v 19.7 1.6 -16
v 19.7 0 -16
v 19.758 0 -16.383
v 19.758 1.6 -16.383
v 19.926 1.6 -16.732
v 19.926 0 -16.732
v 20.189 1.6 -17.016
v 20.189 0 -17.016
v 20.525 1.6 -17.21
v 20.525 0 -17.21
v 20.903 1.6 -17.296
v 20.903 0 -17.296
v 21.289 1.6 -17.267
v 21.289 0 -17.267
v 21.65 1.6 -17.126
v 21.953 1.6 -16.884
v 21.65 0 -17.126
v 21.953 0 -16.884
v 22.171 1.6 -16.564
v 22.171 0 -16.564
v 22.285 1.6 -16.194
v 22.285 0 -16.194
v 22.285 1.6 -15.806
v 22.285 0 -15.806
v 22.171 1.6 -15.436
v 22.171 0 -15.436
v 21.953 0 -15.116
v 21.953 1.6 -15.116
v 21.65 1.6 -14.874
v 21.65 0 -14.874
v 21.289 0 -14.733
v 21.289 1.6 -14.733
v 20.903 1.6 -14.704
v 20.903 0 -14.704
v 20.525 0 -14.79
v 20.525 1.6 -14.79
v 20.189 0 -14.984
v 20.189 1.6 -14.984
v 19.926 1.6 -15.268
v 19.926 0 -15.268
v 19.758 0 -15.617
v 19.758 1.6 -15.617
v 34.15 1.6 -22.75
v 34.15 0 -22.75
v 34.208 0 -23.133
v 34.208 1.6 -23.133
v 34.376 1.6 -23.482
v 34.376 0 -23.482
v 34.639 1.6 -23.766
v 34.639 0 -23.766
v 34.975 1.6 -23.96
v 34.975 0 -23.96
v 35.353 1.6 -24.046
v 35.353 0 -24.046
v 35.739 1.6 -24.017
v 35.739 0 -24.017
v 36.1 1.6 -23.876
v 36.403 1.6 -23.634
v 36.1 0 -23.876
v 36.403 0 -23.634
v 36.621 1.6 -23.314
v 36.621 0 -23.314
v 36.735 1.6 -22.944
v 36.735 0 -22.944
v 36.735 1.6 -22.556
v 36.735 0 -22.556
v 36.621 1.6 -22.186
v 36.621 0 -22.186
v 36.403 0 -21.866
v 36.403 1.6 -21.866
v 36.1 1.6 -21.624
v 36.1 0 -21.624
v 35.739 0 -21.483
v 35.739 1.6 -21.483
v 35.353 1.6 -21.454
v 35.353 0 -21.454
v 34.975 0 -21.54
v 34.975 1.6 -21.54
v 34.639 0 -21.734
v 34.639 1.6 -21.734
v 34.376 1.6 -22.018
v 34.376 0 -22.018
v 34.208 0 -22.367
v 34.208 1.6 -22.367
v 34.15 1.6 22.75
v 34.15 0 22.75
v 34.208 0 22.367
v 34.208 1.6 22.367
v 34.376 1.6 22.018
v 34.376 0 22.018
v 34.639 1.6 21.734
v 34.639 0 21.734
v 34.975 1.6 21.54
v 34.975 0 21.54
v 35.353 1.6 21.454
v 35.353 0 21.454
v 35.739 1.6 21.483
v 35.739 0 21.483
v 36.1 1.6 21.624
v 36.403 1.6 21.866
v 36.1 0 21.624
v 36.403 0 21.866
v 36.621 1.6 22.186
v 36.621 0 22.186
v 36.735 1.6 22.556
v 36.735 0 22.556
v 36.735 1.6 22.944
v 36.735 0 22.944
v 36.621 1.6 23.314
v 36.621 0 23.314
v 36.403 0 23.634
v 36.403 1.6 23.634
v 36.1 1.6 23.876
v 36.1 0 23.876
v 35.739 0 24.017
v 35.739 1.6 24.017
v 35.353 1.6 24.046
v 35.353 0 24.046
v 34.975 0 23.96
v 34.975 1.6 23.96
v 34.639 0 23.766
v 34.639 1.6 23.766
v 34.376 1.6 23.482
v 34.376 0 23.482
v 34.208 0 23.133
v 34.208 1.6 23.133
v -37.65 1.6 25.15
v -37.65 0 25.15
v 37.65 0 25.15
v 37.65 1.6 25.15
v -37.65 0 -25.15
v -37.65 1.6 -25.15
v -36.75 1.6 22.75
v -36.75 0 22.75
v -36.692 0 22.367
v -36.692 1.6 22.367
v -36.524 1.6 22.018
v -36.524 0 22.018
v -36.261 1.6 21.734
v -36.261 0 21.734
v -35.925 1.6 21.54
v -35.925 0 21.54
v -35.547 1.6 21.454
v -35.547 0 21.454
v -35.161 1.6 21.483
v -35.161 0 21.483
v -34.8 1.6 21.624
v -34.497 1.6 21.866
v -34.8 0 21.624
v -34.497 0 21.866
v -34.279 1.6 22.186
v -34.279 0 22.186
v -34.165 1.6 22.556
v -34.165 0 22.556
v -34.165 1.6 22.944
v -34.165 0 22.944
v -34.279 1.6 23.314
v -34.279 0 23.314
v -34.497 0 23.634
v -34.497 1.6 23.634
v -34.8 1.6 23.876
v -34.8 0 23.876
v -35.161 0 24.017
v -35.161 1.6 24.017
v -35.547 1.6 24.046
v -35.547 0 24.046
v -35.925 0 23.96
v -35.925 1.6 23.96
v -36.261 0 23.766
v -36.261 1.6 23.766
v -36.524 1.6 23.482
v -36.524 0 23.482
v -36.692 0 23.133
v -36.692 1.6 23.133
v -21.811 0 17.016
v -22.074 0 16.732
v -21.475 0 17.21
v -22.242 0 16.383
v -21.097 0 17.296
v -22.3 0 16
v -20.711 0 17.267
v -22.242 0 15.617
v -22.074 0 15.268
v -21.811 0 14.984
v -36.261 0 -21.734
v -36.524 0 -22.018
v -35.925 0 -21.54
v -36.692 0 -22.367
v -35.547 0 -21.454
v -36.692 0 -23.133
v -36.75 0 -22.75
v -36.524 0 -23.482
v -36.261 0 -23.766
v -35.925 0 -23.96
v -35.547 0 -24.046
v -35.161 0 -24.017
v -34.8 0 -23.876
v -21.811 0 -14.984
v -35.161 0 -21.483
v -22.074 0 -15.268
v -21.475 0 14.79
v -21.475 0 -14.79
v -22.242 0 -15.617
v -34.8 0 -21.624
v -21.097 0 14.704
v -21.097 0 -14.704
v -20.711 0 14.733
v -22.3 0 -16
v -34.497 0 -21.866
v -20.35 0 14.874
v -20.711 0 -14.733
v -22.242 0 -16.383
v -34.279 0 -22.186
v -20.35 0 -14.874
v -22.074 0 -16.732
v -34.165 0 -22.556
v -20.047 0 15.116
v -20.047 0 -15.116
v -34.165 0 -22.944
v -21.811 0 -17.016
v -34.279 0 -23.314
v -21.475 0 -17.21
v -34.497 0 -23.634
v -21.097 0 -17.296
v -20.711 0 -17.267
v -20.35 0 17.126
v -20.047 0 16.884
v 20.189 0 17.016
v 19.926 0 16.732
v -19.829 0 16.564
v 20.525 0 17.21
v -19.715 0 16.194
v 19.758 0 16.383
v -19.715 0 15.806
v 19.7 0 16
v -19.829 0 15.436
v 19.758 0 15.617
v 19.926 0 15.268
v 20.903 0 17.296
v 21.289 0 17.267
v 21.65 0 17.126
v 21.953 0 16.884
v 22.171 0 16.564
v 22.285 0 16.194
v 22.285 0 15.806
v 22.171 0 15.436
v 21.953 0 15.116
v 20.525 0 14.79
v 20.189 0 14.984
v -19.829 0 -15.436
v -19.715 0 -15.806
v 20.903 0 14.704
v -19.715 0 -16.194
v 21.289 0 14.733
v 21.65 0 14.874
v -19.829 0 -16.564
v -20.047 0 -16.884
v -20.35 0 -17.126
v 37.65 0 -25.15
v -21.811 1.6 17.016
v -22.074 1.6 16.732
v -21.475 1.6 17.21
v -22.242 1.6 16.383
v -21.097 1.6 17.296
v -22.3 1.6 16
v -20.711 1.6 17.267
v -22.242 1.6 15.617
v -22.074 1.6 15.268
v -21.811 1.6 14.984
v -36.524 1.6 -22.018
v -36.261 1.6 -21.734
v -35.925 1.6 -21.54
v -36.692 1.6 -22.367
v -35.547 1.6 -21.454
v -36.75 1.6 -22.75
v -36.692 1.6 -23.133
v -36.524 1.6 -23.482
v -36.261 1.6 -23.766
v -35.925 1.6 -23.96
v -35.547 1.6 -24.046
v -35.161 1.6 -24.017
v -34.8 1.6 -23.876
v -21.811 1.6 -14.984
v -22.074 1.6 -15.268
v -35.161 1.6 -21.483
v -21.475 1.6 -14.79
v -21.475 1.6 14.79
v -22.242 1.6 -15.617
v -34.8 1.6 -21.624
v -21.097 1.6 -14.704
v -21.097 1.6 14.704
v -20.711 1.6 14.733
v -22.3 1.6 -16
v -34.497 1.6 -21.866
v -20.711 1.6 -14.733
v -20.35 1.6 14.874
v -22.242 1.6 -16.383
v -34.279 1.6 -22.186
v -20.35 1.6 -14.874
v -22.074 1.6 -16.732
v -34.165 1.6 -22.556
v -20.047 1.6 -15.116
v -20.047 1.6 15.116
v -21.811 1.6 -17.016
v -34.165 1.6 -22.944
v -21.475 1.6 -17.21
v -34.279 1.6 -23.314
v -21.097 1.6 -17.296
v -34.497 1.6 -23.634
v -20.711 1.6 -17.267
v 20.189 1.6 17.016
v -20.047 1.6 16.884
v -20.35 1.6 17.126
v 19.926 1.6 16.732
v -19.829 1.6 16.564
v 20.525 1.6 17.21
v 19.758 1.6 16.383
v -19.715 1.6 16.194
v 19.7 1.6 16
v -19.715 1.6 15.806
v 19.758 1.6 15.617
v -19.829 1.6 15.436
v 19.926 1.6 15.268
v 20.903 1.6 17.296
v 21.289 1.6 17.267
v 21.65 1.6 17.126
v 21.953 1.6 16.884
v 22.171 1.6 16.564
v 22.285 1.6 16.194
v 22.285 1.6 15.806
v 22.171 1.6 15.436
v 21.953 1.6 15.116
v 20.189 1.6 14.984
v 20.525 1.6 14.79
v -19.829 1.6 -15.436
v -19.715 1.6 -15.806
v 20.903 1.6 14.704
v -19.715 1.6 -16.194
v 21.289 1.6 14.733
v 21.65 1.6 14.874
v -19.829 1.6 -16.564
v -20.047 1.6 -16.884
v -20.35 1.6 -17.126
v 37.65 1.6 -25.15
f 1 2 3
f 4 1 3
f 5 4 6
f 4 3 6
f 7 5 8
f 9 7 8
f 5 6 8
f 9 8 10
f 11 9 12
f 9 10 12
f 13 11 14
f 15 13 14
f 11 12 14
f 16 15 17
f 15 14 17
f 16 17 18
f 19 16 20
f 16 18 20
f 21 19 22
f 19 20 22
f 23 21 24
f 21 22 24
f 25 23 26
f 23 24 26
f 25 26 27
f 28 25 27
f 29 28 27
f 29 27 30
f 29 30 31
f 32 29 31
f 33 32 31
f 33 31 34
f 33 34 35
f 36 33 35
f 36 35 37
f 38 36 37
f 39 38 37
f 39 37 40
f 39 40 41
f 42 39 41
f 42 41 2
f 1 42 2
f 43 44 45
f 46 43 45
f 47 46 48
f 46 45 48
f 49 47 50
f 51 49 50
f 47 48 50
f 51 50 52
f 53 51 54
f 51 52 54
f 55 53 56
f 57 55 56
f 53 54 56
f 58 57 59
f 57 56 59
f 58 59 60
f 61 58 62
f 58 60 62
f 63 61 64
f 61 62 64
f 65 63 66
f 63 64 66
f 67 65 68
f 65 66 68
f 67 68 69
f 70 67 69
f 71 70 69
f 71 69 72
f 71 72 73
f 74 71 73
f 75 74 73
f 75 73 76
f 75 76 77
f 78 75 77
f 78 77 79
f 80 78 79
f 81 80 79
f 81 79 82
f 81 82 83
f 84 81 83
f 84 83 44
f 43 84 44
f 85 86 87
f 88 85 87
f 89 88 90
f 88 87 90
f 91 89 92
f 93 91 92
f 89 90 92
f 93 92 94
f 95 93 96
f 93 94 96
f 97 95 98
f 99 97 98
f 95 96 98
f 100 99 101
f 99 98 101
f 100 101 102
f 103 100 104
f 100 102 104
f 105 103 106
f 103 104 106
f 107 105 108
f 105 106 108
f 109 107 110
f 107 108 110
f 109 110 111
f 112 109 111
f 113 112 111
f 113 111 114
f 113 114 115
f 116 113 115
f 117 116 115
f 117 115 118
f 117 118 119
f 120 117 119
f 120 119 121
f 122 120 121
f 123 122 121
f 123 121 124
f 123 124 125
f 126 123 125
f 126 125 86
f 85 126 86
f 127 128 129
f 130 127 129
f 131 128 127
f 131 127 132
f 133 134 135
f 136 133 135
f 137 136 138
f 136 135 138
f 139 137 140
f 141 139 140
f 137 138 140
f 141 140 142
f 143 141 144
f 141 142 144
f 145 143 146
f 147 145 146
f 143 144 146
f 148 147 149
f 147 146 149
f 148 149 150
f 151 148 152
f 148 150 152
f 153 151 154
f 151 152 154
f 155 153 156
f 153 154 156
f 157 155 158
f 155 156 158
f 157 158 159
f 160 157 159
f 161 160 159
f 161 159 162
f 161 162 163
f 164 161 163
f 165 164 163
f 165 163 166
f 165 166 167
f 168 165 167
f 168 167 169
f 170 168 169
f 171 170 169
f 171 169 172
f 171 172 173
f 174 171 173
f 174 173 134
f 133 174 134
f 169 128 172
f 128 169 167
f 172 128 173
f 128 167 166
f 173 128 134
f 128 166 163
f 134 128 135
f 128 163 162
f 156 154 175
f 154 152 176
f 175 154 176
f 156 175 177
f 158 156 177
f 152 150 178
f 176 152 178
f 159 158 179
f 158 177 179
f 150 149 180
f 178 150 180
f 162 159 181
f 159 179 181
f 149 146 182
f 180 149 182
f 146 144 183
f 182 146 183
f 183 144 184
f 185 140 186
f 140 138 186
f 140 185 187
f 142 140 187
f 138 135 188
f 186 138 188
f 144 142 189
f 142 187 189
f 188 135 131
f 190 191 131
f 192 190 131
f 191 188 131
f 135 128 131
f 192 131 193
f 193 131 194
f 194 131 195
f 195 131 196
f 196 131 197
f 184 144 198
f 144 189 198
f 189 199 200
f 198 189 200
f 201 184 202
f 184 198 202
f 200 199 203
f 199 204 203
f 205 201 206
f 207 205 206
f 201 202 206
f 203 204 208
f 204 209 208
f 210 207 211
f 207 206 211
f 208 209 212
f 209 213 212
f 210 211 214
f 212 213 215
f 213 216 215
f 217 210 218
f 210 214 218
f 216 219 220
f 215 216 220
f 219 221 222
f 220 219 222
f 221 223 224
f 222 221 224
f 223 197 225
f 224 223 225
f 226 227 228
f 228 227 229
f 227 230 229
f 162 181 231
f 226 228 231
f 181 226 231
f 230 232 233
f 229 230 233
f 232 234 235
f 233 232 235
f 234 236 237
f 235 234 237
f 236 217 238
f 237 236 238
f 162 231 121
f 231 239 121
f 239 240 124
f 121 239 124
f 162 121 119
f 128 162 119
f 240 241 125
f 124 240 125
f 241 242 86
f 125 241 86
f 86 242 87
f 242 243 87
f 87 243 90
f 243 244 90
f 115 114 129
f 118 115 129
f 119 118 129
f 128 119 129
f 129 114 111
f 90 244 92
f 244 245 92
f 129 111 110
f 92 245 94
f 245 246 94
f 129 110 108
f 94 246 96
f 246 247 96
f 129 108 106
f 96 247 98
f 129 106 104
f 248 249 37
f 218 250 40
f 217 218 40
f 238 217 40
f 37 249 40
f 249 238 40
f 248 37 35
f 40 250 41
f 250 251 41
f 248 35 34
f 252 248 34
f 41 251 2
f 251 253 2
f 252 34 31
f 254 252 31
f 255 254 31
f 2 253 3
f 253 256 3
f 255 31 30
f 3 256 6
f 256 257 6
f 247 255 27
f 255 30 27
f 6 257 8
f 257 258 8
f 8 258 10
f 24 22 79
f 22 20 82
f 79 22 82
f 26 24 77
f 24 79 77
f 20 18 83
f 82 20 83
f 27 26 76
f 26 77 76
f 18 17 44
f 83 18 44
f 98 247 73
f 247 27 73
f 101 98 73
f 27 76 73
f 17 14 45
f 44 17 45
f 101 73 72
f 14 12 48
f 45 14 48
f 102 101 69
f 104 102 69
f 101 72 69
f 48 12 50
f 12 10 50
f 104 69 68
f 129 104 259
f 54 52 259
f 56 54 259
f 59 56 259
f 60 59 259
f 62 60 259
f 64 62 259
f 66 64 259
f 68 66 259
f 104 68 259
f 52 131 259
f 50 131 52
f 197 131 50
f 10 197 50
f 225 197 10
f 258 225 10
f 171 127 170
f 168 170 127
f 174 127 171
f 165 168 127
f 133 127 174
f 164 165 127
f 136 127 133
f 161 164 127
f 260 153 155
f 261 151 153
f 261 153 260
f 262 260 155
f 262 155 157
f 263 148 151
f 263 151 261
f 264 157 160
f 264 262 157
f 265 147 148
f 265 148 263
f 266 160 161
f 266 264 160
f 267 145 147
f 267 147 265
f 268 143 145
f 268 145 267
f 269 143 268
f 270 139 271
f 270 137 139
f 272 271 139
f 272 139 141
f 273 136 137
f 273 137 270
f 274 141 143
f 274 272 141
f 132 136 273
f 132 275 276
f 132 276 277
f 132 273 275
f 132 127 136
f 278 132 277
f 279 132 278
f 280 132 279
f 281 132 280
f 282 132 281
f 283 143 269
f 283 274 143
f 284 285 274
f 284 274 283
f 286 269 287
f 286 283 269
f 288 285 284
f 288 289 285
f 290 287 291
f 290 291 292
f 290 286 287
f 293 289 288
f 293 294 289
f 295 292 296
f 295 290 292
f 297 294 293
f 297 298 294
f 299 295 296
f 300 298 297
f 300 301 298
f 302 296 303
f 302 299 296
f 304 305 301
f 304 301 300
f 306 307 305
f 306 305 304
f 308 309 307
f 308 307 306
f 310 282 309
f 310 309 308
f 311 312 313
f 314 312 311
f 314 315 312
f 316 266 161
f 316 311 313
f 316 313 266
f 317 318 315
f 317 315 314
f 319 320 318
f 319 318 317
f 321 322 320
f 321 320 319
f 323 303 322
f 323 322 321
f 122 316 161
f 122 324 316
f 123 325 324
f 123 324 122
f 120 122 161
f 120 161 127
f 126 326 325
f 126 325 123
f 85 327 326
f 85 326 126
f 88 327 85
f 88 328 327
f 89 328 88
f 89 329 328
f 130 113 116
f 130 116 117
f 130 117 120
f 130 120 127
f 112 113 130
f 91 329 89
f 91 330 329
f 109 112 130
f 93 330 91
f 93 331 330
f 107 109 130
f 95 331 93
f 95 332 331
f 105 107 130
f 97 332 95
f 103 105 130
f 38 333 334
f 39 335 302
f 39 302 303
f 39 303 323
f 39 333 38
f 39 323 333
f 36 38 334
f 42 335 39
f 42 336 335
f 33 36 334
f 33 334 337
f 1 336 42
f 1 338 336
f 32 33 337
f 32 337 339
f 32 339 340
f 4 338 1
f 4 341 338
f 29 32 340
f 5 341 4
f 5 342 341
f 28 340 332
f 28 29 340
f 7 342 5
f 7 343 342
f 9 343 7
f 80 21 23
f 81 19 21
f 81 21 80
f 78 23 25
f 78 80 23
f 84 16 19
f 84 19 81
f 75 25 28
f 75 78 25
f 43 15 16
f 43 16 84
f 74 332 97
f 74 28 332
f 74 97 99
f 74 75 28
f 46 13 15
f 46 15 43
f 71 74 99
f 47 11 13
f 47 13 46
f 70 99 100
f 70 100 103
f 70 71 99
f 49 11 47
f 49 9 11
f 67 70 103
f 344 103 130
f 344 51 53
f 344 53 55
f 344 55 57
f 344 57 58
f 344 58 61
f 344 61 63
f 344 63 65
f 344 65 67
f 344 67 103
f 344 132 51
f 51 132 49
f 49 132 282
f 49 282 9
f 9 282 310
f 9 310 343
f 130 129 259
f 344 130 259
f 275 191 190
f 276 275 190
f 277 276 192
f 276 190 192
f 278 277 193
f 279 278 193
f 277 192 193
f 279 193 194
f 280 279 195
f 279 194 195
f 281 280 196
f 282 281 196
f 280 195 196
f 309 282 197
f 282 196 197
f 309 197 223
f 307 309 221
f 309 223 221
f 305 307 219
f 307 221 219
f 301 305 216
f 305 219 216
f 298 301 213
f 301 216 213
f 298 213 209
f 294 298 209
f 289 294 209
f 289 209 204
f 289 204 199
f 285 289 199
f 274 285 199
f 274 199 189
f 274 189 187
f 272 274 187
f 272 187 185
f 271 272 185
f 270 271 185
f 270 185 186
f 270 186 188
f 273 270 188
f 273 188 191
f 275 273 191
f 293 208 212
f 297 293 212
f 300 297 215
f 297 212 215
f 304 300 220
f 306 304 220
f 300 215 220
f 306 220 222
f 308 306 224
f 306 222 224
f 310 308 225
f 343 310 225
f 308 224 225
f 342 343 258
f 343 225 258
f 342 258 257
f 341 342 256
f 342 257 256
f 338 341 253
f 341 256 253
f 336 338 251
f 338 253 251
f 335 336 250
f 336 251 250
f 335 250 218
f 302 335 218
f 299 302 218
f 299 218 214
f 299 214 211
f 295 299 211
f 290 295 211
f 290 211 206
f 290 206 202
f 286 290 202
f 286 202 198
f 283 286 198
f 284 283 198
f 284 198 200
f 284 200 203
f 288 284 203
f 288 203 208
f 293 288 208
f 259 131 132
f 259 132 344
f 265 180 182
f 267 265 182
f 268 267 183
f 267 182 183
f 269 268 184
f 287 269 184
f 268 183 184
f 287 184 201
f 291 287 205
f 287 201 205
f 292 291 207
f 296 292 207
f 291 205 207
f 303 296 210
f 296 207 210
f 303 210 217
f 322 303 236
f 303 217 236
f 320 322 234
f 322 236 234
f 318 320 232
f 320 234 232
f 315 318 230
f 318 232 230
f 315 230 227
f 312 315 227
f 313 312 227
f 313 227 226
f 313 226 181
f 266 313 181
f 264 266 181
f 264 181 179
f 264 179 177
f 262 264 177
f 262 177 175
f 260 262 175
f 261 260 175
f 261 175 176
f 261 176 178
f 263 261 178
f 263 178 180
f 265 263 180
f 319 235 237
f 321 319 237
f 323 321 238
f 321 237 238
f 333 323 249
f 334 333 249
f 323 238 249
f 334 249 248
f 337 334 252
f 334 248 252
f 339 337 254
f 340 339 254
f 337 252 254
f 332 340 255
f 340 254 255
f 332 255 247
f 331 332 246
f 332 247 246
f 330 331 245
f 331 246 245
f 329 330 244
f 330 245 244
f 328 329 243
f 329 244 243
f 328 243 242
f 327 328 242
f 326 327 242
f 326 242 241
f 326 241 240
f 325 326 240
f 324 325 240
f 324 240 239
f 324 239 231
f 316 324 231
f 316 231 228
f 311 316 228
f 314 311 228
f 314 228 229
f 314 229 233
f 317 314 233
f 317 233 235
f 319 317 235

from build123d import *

# Parameters (mm, degrees)
CROQUIS7_W                   = 75.3
CROQUIS7_H                   = 50.3
SALIENTE_EXTRUIR1_DEPTH      = 1.6
TALADRO_DE_MARGEN_PARA_M23_D = 2.6
TALADRO_DE_MARGEN_PARA_M24_D = 2.6


with BuildPart() as part:
    # Croquis7 → Saliente-Extruir1 (new body)
    with BuildSketch(Plane(origin=(0, 0, 0), x_dir=(1, 0, 0), z_dir=(0, 1, 0))):
        Rectangle(CROQUIS7_W, CROQUIS7_H)
    extrude(amount=SALIENTE_EXTRUIR1_DEPTH)

    # Taladro de margen para M23 (through all)
    with Locations(Plane(origin=(0, 1.6, 0), x_dir=(1, 0, 0), z_dir=(0, 1, 0))):
        with Locations((-35.45, 22.75), (35.45, 22.75), (35.45, -22.75), (-35.45, -22.75)):
            Hole(TALADRO_DE_MARGEN_PARA_M23_D / 2)

    # Taladro de margen para M24 (through all)
    with Locations(Plane(origin=(0, 1.6, 0), x_dir=(1, 0, 0), z_dir=(0, 1, 0))):
        with Locations((-21, 16), (21, 16), (21, -16), (-21, -16)):
            Hole(TALADRO_DE_MARGEN_PARA_M24_D / 2)


solid = part.part
